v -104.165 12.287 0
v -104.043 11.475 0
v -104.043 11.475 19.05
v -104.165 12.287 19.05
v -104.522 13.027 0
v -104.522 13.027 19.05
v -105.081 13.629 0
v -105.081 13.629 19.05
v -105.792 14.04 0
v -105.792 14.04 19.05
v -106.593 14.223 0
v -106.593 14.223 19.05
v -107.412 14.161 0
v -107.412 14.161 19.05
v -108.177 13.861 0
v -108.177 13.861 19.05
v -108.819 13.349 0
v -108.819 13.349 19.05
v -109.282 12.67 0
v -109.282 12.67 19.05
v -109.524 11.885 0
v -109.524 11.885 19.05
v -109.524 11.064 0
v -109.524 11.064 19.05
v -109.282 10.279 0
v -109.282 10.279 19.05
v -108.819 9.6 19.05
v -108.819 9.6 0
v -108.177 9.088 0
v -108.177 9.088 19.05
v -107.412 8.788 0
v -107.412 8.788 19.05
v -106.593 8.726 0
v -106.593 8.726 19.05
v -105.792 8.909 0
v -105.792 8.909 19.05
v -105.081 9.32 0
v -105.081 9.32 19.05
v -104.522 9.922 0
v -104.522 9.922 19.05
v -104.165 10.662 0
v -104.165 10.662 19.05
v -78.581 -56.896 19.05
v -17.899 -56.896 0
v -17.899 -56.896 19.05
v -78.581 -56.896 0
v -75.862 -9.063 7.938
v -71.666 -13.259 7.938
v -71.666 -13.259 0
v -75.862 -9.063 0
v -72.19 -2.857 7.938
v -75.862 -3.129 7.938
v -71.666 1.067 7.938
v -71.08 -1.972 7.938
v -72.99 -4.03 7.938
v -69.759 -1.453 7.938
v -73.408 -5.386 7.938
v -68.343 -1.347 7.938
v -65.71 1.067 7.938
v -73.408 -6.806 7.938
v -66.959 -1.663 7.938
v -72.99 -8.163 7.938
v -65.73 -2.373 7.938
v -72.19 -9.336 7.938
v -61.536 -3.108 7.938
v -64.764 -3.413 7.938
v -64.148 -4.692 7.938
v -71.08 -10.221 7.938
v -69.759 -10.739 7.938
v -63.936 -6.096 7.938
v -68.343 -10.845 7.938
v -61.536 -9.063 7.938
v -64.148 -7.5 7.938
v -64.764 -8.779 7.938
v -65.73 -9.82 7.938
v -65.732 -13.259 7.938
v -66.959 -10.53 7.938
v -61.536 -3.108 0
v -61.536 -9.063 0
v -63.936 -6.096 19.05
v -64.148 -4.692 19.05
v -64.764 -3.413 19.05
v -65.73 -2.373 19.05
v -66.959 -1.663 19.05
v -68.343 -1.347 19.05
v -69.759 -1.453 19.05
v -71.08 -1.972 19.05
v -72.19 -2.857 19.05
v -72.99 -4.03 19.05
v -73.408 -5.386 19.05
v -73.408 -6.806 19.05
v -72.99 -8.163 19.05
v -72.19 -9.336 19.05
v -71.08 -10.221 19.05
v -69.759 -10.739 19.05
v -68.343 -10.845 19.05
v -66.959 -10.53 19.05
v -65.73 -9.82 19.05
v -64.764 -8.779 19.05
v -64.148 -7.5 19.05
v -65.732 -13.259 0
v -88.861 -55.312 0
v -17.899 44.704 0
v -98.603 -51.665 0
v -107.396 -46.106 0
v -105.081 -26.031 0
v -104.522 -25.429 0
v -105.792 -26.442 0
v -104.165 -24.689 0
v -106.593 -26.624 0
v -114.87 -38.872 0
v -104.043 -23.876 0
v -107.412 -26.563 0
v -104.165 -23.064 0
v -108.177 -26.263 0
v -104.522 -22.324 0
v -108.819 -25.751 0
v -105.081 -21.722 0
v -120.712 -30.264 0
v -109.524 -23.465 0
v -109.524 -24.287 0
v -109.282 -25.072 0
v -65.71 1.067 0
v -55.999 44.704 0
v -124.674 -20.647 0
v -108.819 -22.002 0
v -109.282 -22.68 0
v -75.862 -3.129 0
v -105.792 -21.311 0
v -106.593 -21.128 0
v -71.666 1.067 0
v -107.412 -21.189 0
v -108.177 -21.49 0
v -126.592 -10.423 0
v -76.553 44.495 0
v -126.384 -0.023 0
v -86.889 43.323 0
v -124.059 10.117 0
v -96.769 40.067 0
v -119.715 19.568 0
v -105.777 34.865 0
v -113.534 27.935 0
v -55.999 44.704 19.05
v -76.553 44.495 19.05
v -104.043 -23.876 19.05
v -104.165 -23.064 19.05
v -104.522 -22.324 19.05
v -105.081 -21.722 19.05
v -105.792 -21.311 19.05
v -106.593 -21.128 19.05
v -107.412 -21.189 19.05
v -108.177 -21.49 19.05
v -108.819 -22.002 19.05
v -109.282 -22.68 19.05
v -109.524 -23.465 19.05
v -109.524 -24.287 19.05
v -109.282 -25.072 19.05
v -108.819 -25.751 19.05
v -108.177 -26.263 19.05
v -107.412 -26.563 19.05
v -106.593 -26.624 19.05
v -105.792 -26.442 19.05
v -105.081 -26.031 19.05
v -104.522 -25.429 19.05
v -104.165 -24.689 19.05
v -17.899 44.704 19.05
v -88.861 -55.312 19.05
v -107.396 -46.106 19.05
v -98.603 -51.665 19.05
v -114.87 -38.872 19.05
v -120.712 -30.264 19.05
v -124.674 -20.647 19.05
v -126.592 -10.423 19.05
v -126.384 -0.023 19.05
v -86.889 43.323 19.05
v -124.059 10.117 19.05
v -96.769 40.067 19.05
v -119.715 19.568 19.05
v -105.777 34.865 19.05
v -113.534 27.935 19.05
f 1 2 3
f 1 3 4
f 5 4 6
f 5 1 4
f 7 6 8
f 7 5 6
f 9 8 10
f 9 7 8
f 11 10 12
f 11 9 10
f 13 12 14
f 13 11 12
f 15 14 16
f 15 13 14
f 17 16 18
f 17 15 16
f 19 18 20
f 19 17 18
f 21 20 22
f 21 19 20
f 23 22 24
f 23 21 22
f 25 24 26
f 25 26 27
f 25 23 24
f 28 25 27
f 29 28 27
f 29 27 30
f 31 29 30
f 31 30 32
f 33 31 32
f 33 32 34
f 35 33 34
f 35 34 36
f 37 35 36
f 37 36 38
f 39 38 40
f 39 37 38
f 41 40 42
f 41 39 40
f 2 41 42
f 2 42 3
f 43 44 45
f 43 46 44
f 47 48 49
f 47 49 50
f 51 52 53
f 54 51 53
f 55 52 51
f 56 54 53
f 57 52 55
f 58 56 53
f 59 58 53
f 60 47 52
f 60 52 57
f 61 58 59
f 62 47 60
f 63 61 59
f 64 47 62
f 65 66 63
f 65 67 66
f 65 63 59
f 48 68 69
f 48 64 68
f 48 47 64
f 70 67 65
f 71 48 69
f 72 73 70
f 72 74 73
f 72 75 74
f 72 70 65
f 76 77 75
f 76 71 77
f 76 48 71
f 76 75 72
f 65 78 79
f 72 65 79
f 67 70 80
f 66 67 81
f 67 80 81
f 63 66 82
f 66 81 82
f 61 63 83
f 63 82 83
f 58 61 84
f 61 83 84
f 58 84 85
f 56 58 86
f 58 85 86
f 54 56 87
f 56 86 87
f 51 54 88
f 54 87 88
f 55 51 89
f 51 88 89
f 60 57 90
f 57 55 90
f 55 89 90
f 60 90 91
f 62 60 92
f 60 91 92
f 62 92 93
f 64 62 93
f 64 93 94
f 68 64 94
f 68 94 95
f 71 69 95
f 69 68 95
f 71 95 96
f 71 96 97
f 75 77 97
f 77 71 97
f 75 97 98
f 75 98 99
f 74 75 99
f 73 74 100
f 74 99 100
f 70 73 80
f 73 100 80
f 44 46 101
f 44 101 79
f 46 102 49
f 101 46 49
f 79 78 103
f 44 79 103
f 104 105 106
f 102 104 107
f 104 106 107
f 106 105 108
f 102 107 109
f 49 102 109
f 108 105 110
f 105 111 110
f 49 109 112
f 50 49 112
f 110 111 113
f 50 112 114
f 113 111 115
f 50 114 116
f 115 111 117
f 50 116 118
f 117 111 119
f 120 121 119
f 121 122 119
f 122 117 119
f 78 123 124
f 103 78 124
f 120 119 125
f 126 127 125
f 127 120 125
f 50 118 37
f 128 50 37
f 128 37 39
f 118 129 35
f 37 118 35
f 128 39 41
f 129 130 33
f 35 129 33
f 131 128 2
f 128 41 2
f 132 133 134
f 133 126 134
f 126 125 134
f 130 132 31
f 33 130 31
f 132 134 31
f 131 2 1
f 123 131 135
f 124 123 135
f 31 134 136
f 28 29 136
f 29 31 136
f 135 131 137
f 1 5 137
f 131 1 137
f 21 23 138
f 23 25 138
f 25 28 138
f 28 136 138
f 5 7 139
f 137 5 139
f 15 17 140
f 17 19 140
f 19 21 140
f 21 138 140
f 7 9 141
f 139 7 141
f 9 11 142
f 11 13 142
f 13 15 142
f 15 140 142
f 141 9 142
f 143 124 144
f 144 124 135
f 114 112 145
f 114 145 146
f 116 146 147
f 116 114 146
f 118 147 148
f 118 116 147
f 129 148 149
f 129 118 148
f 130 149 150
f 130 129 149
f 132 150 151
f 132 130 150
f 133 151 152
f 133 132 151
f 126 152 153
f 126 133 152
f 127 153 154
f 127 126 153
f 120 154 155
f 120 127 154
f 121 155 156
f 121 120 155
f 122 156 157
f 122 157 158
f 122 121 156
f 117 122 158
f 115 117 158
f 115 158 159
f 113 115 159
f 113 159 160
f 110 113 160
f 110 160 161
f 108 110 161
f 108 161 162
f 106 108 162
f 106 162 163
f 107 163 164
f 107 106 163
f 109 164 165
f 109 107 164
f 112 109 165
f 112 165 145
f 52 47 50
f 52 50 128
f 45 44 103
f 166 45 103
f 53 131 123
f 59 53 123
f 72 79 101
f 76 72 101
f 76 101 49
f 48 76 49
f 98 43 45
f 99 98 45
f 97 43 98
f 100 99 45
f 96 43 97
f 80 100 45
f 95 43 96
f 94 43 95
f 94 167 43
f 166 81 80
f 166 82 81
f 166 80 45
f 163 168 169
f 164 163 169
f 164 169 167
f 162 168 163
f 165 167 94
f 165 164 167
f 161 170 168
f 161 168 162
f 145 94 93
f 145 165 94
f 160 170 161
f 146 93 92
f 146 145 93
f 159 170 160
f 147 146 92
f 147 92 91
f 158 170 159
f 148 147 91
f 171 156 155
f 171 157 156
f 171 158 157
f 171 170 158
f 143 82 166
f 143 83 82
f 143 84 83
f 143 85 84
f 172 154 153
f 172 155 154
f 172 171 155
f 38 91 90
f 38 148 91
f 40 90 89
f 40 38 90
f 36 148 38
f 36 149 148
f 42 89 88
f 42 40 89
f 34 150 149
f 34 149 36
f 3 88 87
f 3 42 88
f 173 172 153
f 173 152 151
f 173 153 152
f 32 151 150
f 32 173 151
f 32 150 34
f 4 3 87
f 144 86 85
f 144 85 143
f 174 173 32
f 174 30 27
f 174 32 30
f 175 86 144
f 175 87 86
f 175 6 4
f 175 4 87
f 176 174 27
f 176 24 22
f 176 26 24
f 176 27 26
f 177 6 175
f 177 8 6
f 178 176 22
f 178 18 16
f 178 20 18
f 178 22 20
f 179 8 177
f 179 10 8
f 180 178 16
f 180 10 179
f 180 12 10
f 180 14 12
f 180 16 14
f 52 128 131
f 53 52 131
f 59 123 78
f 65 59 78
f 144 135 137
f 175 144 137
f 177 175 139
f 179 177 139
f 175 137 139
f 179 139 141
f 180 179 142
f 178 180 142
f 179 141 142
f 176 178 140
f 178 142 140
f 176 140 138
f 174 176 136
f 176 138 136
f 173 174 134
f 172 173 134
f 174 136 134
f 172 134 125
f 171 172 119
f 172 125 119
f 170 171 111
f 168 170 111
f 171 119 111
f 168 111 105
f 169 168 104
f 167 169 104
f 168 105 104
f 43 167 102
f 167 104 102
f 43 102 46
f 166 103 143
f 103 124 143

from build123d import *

# Parameters (mm, degrees)
F0_R     = 2.7559
F1_DEPTH = 19.05
F2_DEPTH = 12.7
F3_DEPTH = 25.4
F4_R     = 4.7625
F5_DEPTH = 19.051
F6_R     = 4.7625
F7_DEPTH = 7.9375


with BuildPart() as f1:
    # F0 (on Top) → F1 (new body)
    with BuildSketch(Plane.XY):
        with BuildLine():
            Line((-55.9988788353, 44.7037652499), (-76.5532134465, 44.4946135236))
            ThreePointArc((-76.5532134465, 44.4946135236), (-126.7555499575, -5.2172696713), (-78.5805513553, -56.8962347501))
            Line((-78.5805513553, -56.8962347501), (-55.9988788353, -56.8962347501))
            Line((-55.9988788353, -56.8962347501), (-55.9988788353, 44.7037652499))
        make_face()
        with Locations((-106.7988788353, -23.8762347501)):
            Circle(F0_R, mode=Mode.SUBTRACT)
        with Locations((-106.7988788353, 11.4746135236)):
            Circle(F0_R, mode=Mode.SUBTRACT)
    extrude(amount=F1_DEPTH)

    # F2 (add): a face of the model
    f2_faces = [f1.faces().sort_by_distance(p)[0] for p in [
        (-55.9988788353, -6.0962347501, 9.525),
    ]]
    extrude(f2_faces, amount=F2_DEPTH)

    # F3 (add): a face of the model
    f3_faces = [f1.faces().sort_by_distance(p)[0] for p in [
        (-43.2988788353, -6.0962347501, 9.525),
    ]]
    extrude(f3_faces, amount=F3_DEPTH)

    # F4 (on face) → F5 (cut, through all)
    with BuildSketch(Plane.XY.offset(19.05)):
        with Locations((-68.6988788353, -6.0962347501)):
            Circle(F4_R)
    extrude(amount=-F5_DEPTH, mode=Mode.SUBTRACT)

    # F6 (on face) → F7 (cut)
    with BuildSketch(Plane(origin=(0, 0, 0), x_dir=(1, 0, 0), z_dir=(0, 0, -1))):
        Polygon((-75.8616788353, 3.1293058456), (-71.6658077398, -1.0665652499), (-65.7102826454, -1.0665652499), (-61.5360788353, 3.1076385602), (-61.5360788353, 9.0631636547), (-65.7319499307, 13.2590347501), (-71.6658077398, 13.2590347501), (-75.8616788353, 9.0631636547), align=None)
        with Locations((-68.6988788353, 6.0962347501)):
            Circle(F6_R, mode=Mode.SUBTRACT)
    extrude(amount=-F7_DEPTH, mode=Mode.SUBTRACT)


solid = f1.part
